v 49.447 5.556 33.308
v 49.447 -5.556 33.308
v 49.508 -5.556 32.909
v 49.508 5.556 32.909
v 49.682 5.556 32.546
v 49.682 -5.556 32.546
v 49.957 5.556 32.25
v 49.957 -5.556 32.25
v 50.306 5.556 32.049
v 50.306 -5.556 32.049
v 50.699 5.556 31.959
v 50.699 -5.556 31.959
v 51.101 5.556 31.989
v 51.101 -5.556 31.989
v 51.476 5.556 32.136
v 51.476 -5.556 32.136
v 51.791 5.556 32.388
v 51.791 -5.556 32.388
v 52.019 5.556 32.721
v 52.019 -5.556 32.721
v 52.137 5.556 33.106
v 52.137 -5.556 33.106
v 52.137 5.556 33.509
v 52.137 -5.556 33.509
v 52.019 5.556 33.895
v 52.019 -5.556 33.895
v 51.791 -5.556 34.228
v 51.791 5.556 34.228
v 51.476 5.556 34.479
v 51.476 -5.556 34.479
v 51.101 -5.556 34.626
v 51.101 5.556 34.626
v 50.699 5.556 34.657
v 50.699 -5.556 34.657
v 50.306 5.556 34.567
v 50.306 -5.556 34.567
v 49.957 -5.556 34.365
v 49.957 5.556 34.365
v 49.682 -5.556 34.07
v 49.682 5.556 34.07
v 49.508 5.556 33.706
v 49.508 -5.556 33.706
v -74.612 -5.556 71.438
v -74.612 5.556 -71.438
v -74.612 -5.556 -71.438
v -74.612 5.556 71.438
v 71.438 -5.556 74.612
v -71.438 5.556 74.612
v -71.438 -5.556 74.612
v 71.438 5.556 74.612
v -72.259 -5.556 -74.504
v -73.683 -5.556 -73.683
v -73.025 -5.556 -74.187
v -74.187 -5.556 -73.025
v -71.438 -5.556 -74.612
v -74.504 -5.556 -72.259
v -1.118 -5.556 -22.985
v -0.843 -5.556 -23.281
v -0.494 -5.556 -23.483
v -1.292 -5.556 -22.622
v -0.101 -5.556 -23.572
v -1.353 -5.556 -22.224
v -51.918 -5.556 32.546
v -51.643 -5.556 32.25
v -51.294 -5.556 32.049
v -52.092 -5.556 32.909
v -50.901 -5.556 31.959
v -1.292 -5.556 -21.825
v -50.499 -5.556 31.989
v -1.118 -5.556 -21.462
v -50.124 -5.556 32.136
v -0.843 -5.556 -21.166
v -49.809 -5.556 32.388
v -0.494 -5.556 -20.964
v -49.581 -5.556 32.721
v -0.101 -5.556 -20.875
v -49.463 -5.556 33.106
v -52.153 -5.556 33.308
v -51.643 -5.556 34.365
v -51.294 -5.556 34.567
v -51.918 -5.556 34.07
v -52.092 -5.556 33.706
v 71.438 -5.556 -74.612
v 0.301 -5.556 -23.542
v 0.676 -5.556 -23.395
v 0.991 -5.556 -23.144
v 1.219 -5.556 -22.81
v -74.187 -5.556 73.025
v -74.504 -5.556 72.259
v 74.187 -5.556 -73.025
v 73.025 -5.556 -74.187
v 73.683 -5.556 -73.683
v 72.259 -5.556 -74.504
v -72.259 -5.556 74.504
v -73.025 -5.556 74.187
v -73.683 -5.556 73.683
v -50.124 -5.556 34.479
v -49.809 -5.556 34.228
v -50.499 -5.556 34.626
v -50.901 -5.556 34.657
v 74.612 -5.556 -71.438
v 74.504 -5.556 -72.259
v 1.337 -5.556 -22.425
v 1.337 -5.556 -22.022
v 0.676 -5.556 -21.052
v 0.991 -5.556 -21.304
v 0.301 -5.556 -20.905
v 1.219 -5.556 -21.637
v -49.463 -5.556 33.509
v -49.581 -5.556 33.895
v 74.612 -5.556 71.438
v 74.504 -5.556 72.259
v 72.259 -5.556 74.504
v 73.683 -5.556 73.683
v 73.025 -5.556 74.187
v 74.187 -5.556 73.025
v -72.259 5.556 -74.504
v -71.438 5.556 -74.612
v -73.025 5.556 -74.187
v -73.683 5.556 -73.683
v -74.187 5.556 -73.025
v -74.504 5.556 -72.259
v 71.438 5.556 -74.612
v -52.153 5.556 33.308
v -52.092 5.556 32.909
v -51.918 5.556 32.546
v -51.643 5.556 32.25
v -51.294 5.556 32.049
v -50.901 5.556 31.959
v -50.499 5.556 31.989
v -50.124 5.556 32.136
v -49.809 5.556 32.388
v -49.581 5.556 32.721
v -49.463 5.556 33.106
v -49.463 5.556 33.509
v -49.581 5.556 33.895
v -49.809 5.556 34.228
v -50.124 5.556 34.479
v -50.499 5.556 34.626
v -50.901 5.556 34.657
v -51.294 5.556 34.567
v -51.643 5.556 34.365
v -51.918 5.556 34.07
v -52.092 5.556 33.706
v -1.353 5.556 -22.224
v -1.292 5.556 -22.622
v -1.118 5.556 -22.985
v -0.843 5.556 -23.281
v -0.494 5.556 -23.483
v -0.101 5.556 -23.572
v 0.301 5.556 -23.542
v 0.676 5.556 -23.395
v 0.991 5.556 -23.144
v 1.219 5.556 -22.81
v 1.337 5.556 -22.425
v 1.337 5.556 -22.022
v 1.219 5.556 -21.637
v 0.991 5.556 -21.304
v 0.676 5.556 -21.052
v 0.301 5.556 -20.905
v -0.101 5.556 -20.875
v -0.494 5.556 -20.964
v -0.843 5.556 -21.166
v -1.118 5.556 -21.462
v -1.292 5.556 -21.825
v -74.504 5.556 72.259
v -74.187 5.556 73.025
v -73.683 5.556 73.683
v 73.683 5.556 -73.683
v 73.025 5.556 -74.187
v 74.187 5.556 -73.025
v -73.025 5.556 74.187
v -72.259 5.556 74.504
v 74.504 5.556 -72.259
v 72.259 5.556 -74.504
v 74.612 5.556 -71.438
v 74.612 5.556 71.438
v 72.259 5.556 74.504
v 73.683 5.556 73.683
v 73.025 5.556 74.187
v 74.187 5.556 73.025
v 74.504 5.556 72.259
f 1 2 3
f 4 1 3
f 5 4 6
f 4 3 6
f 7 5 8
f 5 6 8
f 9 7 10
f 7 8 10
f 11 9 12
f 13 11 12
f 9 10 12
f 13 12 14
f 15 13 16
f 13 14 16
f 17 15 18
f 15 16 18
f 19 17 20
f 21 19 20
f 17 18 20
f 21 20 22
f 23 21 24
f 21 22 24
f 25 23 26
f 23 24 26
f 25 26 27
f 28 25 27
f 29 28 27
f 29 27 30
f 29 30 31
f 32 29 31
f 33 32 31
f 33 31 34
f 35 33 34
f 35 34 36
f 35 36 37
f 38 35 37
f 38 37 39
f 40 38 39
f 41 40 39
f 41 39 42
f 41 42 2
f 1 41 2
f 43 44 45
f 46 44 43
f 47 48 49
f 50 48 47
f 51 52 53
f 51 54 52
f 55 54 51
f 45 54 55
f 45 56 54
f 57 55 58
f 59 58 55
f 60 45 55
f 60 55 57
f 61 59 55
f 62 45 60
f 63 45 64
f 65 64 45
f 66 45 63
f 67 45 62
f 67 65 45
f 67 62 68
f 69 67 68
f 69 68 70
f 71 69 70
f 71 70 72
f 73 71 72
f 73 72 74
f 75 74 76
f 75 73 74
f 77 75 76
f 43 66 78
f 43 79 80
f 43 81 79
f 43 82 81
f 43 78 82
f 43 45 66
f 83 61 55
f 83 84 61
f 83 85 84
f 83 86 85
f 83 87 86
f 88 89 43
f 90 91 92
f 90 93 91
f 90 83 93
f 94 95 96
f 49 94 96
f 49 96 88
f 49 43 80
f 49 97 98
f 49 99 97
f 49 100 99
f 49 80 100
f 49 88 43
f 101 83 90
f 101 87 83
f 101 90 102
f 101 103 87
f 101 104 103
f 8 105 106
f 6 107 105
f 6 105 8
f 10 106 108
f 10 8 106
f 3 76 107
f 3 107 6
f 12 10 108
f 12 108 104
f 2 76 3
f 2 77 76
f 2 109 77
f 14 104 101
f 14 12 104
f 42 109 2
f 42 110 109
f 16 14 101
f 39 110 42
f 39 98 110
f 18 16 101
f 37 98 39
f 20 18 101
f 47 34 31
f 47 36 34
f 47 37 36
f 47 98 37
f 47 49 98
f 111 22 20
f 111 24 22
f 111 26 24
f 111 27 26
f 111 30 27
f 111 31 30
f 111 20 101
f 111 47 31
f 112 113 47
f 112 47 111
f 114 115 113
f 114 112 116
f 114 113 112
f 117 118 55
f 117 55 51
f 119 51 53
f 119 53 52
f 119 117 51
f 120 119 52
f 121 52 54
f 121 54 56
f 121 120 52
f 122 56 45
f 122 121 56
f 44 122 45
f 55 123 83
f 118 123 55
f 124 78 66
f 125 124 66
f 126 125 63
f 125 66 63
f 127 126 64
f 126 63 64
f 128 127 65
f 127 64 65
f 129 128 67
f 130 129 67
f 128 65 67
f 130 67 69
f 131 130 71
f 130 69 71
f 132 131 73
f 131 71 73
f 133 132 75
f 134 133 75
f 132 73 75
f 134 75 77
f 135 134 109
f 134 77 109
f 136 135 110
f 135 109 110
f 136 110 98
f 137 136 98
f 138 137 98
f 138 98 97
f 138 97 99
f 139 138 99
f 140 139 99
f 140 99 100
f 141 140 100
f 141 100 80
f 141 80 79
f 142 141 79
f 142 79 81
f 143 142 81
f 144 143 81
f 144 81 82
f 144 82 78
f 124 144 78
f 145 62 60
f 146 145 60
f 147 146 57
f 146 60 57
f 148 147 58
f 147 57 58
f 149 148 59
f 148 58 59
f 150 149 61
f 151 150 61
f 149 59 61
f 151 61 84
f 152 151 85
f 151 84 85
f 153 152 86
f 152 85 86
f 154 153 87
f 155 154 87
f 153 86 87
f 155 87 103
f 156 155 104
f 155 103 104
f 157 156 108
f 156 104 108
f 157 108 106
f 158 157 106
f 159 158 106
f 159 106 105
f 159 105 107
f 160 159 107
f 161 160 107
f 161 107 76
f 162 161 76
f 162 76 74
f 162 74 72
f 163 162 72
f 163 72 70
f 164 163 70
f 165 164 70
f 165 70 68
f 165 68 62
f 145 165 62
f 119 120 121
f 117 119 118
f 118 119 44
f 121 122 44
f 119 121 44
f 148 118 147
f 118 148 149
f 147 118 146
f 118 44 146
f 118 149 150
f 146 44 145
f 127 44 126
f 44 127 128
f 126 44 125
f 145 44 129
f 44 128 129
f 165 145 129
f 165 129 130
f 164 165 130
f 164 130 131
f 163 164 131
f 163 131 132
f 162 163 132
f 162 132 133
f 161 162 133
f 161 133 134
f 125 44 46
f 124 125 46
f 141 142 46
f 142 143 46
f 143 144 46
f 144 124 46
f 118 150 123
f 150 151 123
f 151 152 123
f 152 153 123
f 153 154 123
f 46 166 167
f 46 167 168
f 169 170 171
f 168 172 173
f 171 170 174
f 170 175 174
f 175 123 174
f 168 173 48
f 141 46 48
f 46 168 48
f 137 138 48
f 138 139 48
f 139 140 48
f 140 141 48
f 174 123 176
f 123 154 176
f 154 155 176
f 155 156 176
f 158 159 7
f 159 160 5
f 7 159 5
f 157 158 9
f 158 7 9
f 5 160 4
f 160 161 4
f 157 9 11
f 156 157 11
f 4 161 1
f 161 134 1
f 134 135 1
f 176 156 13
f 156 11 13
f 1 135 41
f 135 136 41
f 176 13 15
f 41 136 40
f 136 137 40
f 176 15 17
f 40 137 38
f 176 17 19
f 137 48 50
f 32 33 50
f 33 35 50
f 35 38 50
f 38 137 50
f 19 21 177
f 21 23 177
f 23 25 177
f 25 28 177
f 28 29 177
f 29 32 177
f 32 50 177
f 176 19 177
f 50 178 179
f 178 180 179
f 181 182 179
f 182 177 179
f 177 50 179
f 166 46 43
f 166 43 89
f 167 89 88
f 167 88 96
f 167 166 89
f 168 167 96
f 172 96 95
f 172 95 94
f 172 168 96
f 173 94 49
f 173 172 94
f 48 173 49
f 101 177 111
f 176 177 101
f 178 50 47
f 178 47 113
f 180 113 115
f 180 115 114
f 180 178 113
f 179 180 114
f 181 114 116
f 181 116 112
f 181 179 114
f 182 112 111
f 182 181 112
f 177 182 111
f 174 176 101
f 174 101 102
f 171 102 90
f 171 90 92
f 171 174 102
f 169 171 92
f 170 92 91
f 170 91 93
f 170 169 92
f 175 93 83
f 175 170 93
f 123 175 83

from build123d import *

# Parameters (mm, degrees)
SKETCH3_W             = 152.4
SKETCH3_H             = 11.1125
BOSS_EXTRUDE1_DEPTH   = 76.2
F_6_32_TAPPED_HOLE1_D = 2.7051
SKETCH6_OUTSIDE_W     = 197.562
SKETCH6_OUTSIDE_H     = 197.562
CUT_EXTRUDE1_DEPTH    = 109.334517381


with BuildPart() as part:
    # Sketch3 → Boss-Extrude1 (new, symmetric)
    with BuildSketch(Plane.XY):
        Rectangle(SKETCH3_W, SKETCH3_H)
    extrude(amount=BOSS_EXTRUDE1_DEPTH, both=True)

    # #6-32 Tapped Hole1 (through all)
    with Locations(Plane(origin=(0, 5.55625, 0), x_dir=(1, 0, 0), z_dir=(0, 1, 0))):
        with Locations((0, 22.223542588), (50.8, -33.30776944), (-50.8, -33.30776944)):
            Hole(F_6_32_TAPPED_HOLE1_D / 2)

    # Sketch6 outside → Cut-Extrude1 (cut, through all)
    with BuildSketch(Plane(origin=(0, 5.55625, 0), x_dir=(1, 0, 0), z_dir=(0, 1, 0))):
        Rectangle(SKETCH6_OUTSIDE_W, SKETCH6_OUTSIDE_H)
        with BuildLine():
            Line((-71.4375, -74.6125), (71.4375, -74.6125))
            ThreePointArc((71.4375, -74.6125), (73.68256403, -73.68256403), (74.6125, -71.4375))
            Line((74.6125, -71.4375), (74.6125, 71.4375))
            ThreePointArc((74.6125, 71.4375), (73.68256403, 73.68256403), (71.4375, 74.6125))
            Line((71.4375, 74.6125), (-71.4375, 74.6125))
            ThreePointArc((-71.4375, 74.6125), (-73.68256403, 73.68256403), (-74.6125, 71.4375))
            Line((-74.6125, 71.4375), (-74.6125, -71.4375))
            ThreePointArc((-74.6125, -71.4375), (-73.68256403, -73.68256403), (-71.4375, -74.6125))
        make_face(mode=Mode.SUBTRACT)
    extrude(amount=-CUT_EXTRUDE1_DEPTH, mode=Mode.SUBTRACT)


solid = part.part
